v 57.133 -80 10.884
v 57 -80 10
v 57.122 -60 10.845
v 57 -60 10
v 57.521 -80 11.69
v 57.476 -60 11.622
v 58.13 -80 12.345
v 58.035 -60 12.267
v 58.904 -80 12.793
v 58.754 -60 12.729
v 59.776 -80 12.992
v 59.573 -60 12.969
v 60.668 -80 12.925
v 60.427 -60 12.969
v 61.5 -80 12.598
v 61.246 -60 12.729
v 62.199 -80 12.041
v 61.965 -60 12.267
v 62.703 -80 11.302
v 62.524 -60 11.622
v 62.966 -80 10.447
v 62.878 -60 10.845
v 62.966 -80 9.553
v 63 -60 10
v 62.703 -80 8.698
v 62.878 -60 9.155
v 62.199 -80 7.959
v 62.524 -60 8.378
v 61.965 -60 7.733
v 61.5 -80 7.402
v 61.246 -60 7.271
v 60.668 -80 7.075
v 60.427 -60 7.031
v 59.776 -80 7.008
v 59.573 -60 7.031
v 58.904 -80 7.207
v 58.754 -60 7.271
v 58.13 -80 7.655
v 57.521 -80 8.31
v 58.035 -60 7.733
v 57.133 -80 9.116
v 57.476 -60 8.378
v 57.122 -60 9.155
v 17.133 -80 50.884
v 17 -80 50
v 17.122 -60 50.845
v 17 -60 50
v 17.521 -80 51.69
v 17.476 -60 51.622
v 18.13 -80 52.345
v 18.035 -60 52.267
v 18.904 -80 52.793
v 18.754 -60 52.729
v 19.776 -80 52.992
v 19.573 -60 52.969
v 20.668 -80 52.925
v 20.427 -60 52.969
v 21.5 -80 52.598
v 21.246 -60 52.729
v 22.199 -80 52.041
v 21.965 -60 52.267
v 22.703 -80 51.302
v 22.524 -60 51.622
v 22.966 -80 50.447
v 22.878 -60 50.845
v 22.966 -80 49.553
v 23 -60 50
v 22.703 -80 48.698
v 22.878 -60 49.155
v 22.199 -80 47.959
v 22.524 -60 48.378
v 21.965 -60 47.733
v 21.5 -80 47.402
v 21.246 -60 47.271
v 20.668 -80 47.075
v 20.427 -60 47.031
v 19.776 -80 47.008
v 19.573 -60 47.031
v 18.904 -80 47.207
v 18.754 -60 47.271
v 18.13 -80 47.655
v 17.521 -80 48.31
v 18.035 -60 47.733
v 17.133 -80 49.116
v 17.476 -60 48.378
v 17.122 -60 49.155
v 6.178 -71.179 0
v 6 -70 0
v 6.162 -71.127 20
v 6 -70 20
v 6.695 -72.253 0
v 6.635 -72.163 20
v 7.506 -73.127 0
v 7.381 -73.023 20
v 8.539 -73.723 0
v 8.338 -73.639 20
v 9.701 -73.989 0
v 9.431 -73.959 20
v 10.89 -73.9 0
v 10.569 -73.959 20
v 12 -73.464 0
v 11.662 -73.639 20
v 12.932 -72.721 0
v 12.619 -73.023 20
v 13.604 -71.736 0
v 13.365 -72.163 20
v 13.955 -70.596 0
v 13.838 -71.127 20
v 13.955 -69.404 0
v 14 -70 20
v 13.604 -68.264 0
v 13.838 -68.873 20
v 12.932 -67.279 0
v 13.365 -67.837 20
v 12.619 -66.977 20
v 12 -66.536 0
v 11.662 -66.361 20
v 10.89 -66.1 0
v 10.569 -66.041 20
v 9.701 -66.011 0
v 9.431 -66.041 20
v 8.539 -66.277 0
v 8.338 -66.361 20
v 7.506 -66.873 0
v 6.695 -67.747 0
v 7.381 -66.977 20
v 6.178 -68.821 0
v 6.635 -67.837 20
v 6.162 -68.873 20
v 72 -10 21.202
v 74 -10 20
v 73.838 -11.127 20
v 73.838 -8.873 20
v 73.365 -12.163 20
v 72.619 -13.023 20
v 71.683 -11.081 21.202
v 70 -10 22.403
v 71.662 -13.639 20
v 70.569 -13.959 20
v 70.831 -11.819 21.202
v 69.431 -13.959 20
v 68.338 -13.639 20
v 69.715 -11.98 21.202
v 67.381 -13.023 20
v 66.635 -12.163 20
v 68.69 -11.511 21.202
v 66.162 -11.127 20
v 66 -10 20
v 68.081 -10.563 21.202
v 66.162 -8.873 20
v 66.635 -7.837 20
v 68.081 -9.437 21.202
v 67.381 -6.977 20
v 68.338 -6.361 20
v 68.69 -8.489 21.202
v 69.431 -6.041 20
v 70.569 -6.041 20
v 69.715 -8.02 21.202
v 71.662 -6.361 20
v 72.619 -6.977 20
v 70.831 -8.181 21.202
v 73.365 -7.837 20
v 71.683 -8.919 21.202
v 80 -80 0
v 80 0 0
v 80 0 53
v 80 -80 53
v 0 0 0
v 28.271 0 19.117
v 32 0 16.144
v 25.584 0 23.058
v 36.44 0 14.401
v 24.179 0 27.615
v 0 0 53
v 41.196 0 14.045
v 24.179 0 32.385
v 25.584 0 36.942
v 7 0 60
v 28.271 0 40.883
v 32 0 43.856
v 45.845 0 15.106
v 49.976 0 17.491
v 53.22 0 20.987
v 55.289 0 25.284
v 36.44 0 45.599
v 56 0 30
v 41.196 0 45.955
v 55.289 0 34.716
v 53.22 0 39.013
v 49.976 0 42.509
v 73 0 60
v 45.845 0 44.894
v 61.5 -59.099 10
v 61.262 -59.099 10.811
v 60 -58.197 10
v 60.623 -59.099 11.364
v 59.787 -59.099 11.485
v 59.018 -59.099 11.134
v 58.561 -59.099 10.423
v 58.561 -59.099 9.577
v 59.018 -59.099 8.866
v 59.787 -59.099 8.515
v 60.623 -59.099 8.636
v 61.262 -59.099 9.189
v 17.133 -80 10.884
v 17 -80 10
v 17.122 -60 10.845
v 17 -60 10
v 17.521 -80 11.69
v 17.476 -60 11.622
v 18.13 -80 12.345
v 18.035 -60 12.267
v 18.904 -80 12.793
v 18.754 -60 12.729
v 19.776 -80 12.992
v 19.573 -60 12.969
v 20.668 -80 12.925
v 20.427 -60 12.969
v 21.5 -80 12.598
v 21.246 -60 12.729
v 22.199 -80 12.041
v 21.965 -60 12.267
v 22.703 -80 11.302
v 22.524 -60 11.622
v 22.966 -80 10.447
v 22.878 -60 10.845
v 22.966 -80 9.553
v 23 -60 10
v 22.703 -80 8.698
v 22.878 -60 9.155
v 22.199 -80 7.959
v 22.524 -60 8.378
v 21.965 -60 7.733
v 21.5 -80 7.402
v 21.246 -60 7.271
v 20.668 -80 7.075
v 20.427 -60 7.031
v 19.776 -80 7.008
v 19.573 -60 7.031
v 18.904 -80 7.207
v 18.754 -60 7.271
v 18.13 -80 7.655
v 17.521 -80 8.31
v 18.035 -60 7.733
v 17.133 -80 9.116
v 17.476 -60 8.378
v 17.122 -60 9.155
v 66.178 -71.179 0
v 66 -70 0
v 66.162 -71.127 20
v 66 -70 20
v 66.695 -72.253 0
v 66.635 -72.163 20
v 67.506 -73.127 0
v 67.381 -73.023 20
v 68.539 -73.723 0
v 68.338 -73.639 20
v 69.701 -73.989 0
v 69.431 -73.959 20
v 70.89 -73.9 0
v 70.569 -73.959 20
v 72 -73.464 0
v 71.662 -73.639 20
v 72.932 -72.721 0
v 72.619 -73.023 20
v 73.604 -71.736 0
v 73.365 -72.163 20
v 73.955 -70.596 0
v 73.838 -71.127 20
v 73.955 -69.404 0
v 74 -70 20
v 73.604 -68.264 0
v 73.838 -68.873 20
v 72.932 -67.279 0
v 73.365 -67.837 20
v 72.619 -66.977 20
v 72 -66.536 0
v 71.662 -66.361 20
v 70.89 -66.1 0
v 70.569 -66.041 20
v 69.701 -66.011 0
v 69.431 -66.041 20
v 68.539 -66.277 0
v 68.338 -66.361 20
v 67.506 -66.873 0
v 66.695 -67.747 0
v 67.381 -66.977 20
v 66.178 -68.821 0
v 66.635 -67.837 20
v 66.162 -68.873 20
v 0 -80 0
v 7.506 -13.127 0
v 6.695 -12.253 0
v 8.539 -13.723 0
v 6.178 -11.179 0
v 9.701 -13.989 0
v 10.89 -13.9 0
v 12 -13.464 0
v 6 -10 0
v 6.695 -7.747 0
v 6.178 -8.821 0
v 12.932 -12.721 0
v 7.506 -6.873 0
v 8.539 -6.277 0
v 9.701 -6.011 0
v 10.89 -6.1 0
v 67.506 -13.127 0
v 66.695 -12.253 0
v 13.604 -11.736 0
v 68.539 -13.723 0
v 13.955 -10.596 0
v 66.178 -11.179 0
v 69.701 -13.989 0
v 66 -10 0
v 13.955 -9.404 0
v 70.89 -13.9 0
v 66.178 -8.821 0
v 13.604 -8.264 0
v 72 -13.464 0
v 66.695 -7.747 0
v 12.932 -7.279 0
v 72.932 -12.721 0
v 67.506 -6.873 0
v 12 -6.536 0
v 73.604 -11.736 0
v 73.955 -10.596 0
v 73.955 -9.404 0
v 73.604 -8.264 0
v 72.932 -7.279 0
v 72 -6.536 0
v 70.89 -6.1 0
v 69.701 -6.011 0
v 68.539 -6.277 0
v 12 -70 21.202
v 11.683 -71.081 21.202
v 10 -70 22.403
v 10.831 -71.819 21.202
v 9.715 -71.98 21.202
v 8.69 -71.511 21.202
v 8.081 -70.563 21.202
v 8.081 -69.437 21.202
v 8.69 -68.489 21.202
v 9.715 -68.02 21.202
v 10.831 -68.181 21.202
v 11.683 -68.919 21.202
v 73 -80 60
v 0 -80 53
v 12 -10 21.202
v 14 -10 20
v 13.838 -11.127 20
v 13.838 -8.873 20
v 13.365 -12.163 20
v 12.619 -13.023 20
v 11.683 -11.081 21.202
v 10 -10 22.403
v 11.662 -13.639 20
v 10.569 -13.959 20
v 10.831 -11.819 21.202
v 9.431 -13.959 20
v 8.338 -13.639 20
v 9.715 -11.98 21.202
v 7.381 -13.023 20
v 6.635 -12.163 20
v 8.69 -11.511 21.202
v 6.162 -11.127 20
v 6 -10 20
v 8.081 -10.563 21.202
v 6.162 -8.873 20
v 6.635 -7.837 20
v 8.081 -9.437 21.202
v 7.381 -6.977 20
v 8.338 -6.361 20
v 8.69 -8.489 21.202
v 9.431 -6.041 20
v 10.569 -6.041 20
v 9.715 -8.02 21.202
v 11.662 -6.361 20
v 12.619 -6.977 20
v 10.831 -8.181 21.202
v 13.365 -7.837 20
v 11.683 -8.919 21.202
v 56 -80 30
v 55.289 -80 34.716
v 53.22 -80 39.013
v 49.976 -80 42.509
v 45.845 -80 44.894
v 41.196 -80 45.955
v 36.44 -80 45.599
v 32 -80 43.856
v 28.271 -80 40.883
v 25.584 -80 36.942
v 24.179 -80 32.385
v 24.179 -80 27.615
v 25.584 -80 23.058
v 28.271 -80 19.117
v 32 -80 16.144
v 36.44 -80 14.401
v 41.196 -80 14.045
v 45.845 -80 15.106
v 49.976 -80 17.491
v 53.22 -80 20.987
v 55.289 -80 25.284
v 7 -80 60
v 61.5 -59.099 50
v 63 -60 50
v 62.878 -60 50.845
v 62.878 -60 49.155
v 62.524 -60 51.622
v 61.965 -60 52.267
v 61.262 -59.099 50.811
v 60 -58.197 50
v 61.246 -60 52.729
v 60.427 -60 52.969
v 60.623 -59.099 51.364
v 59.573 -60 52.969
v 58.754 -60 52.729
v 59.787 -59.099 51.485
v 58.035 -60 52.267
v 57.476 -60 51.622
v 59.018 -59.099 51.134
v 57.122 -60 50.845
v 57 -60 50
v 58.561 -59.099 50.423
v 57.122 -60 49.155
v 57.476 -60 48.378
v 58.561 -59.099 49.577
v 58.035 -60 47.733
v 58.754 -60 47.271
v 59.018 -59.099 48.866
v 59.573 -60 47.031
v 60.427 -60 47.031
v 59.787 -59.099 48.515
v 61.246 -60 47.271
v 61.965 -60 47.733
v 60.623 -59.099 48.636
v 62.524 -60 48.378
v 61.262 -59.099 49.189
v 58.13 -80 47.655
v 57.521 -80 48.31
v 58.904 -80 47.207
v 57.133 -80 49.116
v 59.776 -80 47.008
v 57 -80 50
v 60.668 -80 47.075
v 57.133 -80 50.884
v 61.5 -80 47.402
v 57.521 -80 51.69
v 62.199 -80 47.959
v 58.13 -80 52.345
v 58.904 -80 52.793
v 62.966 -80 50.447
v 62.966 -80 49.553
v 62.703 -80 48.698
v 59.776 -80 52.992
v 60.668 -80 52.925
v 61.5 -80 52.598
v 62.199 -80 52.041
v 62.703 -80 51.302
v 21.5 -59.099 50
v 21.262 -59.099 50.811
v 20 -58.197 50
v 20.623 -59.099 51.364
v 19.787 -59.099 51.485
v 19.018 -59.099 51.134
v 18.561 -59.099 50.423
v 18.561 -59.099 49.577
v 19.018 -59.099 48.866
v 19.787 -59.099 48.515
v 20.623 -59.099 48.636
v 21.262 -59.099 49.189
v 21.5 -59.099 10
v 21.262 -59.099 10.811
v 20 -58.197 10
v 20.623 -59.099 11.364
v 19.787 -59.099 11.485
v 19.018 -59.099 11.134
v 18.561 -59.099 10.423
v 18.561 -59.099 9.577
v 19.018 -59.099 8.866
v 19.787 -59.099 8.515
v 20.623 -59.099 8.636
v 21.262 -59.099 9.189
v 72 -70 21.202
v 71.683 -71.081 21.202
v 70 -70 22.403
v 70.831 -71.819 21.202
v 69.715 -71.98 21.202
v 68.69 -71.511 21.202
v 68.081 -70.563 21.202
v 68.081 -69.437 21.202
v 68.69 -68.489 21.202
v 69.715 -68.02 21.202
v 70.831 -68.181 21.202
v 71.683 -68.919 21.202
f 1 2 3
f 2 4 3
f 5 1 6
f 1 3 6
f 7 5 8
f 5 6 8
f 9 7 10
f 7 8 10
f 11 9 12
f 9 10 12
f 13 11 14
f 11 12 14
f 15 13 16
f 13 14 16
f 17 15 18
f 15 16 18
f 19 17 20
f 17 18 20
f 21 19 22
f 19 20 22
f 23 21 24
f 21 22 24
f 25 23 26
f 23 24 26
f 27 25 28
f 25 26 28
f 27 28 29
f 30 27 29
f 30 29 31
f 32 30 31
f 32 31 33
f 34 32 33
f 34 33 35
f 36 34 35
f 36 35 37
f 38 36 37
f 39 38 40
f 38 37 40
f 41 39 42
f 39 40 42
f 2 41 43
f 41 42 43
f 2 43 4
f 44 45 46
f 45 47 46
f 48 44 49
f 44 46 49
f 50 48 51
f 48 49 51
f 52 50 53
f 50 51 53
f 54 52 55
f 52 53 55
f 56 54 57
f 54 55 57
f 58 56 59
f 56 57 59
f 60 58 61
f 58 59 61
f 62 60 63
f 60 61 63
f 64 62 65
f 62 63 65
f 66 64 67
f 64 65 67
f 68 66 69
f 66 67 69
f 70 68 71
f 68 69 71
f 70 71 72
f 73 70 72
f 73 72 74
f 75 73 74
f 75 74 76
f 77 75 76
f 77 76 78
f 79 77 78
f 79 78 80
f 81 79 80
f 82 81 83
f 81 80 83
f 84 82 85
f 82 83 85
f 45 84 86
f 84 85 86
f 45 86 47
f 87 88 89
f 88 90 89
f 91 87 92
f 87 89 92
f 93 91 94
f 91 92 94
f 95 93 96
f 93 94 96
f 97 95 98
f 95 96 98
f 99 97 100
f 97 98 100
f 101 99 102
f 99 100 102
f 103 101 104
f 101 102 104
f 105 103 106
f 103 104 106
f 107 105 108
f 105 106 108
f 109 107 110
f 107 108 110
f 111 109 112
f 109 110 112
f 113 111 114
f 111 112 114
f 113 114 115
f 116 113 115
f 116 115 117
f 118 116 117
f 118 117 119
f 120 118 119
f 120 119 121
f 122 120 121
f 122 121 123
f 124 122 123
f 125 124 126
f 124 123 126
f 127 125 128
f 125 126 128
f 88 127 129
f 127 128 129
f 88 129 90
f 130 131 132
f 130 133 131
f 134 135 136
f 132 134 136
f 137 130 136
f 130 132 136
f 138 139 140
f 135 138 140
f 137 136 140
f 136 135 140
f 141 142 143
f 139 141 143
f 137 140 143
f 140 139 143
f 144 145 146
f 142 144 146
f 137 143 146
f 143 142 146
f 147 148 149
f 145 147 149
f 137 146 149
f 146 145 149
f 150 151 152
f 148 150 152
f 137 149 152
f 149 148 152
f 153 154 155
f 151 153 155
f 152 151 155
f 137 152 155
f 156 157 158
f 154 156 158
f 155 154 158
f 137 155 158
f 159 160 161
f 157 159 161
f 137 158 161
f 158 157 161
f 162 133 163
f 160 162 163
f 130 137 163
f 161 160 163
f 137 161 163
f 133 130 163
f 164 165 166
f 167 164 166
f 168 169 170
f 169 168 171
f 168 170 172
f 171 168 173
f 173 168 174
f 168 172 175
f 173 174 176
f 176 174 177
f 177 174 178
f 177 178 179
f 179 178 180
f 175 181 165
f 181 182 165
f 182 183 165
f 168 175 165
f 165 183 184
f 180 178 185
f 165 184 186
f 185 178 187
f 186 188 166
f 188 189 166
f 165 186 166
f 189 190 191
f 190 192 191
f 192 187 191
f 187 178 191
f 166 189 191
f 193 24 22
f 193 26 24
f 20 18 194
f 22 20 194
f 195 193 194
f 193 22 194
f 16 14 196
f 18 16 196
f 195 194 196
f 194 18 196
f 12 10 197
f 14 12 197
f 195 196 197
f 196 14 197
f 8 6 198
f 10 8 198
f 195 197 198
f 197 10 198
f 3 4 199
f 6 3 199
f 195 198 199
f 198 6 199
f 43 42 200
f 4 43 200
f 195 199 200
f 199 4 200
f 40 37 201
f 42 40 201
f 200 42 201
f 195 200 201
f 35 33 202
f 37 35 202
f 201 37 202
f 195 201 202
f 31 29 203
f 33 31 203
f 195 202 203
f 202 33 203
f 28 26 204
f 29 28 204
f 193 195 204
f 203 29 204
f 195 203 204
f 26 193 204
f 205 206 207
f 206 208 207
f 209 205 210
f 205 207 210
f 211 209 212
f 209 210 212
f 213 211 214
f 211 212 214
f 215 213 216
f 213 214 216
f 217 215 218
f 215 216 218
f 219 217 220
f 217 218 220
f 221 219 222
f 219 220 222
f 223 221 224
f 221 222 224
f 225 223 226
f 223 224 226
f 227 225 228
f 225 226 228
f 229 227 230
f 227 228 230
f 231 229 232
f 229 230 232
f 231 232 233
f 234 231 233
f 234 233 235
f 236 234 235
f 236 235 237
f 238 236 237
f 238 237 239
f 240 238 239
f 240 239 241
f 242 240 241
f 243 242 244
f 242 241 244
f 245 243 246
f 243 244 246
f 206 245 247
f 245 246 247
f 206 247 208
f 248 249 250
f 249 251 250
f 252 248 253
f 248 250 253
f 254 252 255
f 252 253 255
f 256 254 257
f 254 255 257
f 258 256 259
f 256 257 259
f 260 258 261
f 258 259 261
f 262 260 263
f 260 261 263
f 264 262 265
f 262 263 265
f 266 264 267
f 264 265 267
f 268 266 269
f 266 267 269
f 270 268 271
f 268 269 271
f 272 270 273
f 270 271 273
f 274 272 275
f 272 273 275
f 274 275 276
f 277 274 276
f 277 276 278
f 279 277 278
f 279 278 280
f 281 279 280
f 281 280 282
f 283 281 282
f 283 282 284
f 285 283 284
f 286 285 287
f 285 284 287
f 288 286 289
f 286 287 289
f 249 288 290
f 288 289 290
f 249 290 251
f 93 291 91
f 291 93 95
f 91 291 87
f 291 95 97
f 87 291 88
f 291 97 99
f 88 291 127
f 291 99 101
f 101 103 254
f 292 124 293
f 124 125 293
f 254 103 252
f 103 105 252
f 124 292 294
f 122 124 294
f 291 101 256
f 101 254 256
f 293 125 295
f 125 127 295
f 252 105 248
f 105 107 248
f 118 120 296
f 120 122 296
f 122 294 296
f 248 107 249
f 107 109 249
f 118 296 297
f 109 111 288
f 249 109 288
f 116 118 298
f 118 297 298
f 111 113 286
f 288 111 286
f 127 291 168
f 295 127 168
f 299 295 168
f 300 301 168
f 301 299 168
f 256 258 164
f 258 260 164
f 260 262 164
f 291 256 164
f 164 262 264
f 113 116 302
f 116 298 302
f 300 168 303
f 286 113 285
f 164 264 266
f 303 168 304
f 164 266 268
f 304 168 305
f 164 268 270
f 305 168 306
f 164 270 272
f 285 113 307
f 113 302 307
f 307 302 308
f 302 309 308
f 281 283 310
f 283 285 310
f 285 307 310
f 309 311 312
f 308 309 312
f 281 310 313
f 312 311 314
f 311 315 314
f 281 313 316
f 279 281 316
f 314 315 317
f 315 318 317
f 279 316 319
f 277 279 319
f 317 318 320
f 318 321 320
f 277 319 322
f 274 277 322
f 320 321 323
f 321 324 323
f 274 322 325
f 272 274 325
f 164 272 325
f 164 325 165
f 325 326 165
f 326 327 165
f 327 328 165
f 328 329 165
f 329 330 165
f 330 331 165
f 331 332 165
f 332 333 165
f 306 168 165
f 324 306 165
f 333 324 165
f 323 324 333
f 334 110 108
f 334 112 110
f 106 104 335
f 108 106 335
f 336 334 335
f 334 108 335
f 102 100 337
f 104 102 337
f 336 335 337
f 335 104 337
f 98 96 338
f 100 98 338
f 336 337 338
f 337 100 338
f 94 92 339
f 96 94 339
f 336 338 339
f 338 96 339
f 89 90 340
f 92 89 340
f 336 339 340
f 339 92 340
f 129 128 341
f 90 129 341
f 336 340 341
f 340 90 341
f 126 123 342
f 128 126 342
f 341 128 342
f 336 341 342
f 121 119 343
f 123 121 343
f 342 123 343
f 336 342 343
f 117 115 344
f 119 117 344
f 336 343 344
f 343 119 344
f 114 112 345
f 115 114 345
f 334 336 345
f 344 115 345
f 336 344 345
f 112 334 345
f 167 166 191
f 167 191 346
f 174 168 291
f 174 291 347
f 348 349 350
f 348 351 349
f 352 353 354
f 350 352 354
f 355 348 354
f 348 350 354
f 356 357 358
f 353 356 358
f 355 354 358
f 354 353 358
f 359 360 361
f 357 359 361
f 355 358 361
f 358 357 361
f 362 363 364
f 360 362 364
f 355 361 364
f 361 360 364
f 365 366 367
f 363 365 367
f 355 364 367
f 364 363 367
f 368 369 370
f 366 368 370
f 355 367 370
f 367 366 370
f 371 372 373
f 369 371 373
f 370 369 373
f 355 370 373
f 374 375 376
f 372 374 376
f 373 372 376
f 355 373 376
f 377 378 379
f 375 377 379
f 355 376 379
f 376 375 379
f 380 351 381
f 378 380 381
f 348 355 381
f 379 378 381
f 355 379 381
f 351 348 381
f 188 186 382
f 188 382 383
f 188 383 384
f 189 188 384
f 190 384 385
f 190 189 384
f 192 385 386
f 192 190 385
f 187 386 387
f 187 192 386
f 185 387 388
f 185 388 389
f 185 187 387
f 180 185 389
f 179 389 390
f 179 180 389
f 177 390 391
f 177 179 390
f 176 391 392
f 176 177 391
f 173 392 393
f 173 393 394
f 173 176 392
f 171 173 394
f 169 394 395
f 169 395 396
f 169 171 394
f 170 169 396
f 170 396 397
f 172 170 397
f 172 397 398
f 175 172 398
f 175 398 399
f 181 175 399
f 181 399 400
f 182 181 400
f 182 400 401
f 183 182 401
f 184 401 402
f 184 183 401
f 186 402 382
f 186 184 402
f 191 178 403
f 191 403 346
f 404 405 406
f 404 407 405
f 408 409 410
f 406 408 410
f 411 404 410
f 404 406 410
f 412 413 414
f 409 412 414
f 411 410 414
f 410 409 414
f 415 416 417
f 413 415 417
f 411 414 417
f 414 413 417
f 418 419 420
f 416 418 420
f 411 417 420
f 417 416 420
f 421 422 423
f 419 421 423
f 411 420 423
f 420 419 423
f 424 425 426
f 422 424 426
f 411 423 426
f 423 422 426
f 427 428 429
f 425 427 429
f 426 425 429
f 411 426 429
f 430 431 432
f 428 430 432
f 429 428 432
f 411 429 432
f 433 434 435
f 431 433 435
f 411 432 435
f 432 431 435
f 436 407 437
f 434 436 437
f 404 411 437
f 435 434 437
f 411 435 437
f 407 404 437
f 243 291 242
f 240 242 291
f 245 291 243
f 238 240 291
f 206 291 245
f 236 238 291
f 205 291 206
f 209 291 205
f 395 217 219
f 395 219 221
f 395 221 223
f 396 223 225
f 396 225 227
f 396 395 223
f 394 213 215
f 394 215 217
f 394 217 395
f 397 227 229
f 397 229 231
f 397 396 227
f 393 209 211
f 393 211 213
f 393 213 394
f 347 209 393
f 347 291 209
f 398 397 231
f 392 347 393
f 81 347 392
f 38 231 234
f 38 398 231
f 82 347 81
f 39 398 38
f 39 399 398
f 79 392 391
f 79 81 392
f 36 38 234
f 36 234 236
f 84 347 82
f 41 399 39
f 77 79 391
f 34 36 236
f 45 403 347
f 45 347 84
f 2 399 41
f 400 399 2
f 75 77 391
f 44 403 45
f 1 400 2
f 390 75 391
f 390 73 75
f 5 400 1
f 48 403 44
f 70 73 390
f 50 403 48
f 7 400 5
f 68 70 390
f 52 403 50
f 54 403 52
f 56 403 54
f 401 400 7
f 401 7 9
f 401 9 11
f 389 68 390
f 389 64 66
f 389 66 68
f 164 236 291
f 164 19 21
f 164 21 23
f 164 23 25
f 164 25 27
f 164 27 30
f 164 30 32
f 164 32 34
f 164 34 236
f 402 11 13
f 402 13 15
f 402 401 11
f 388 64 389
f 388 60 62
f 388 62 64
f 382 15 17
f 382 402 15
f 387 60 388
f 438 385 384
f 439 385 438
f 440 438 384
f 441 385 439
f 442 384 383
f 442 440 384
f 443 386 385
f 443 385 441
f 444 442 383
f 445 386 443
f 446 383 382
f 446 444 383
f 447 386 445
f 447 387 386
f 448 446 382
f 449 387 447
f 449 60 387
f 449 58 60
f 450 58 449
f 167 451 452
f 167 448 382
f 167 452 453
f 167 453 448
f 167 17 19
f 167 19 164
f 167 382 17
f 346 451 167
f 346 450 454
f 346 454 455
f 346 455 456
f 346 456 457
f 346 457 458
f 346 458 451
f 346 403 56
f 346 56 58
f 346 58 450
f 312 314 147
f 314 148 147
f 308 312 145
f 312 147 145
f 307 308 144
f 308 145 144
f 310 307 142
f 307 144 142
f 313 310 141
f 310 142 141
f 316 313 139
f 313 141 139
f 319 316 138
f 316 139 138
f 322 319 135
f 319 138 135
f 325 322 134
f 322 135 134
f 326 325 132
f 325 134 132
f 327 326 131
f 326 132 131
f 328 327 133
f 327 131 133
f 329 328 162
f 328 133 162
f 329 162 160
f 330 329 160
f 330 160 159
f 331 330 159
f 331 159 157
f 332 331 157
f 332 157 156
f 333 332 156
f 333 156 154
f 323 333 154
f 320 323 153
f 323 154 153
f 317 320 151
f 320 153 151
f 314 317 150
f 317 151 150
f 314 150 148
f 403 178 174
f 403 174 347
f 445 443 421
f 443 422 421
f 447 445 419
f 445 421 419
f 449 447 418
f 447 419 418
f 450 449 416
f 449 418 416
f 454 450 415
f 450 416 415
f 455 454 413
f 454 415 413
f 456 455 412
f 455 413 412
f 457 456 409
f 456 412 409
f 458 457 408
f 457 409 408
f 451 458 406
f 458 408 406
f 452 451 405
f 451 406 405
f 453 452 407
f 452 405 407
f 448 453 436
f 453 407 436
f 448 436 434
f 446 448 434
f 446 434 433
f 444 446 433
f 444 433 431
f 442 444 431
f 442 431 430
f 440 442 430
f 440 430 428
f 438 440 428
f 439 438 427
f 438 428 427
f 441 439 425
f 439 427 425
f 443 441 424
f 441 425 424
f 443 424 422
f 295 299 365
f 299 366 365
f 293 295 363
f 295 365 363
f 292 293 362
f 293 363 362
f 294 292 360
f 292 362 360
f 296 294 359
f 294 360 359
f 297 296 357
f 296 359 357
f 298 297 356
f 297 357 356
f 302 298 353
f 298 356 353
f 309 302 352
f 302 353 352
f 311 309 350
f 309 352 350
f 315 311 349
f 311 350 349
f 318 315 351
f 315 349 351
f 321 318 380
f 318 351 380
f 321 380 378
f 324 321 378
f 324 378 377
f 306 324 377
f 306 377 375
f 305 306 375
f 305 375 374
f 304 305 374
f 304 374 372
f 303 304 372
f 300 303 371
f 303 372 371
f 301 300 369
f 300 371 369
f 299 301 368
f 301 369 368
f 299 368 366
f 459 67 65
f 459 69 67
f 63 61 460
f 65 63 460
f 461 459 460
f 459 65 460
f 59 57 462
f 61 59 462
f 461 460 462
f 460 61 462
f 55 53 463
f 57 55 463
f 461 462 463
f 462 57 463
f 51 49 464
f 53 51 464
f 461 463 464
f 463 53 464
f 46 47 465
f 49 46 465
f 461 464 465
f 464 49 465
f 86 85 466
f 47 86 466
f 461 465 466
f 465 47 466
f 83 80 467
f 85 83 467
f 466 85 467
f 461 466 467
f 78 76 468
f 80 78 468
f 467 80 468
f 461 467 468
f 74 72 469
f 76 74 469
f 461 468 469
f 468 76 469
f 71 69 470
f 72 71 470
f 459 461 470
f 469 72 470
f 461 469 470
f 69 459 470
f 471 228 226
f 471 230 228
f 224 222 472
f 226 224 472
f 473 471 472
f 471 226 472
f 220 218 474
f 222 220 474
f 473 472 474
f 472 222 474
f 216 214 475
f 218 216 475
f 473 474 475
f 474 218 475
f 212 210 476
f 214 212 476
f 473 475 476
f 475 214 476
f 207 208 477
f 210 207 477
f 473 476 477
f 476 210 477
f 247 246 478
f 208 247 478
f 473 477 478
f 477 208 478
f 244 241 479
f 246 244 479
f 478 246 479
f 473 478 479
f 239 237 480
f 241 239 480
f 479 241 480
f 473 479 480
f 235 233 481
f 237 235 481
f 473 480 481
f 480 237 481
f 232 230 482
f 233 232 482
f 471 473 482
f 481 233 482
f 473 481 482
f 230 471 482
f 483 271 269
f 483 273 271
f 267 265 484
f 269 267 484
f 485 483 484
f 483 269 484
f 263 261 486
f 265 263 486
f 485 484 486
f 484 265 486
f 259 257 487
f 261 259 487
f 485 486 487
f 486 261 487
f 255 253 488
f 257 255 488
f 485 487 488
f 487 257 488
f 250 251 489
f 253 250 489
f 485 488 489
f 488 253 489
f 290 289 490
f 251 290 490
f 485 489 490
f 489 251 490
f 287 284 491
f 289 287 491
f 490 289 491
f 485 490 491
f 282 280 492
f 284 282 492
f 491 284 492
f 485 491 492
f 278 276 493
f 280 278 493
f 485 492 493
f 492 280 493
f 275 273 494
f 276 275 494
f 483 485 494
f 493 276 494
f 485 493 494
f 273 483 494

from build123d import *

# Parameters (mm, degrees)
F0_W     = 80
F0_H     = 60
F0_R     = 16
F1_DEPTH = 80
F2_SIZE  = 7
F4_D     = 6
F4_DEPTH = 20
F4_TIP   = 1.8025818571
F6_D     = 8
F6_DEPTH = 20
F6_TIP   = 2.4034424761


with BuildPart() as f1:
    # F0 (on Front) → F1 (new body)
    with BuildSketch(Plane.XZ):
        with Locations((40, 30)):
            Rectangle(F0_W, F0_H)
        with Locations((40, 30)):
            Circle(F0_R, mode=Mode.SUBTRACT)
    extrude(amount=F1_DEPTH)

    # F2
    f2_edges = [f1.edges().sort_by_distance(p)[0] for p in [
        (0, -40, 60),
        (80, -40, 60),
    ]]
    chamfer(f2_edges, length=F2_SIZE)

    # F4
    with Locations(Plane.XZ.offset(80)):
        with Locations((20, 50), (60, 50), (60, 10), (20, 10)):
            Hole(F4_D / 2, depth=F4_DEPTH)
            with Locations((0, 0, -(F4_DEPTH + F4_TIP / 2))):  # 118° drill point
                Cone(0, F4_D / 2, F4_TIP, mode=Mode.SUBTRACT)

    # F6
    with Locations(Plane(origin=(0, 0, 0), x_dir=(1, 0, 0), z_dir=(0, 0, -1))):
        with Locations((10, 70), (70, 70), (70, 10), (10, 10)):
            Hole(F6_D / 2, depth=F6_DEPTH)
            with Locations((0, 0, -(F6_DEPTH + F6_TIP / 2))):  # 118° drill point
                Cone(0, F6_D / 2, F6_TIP, mode=Mode.SUBTRACT)


solid = f1.part
